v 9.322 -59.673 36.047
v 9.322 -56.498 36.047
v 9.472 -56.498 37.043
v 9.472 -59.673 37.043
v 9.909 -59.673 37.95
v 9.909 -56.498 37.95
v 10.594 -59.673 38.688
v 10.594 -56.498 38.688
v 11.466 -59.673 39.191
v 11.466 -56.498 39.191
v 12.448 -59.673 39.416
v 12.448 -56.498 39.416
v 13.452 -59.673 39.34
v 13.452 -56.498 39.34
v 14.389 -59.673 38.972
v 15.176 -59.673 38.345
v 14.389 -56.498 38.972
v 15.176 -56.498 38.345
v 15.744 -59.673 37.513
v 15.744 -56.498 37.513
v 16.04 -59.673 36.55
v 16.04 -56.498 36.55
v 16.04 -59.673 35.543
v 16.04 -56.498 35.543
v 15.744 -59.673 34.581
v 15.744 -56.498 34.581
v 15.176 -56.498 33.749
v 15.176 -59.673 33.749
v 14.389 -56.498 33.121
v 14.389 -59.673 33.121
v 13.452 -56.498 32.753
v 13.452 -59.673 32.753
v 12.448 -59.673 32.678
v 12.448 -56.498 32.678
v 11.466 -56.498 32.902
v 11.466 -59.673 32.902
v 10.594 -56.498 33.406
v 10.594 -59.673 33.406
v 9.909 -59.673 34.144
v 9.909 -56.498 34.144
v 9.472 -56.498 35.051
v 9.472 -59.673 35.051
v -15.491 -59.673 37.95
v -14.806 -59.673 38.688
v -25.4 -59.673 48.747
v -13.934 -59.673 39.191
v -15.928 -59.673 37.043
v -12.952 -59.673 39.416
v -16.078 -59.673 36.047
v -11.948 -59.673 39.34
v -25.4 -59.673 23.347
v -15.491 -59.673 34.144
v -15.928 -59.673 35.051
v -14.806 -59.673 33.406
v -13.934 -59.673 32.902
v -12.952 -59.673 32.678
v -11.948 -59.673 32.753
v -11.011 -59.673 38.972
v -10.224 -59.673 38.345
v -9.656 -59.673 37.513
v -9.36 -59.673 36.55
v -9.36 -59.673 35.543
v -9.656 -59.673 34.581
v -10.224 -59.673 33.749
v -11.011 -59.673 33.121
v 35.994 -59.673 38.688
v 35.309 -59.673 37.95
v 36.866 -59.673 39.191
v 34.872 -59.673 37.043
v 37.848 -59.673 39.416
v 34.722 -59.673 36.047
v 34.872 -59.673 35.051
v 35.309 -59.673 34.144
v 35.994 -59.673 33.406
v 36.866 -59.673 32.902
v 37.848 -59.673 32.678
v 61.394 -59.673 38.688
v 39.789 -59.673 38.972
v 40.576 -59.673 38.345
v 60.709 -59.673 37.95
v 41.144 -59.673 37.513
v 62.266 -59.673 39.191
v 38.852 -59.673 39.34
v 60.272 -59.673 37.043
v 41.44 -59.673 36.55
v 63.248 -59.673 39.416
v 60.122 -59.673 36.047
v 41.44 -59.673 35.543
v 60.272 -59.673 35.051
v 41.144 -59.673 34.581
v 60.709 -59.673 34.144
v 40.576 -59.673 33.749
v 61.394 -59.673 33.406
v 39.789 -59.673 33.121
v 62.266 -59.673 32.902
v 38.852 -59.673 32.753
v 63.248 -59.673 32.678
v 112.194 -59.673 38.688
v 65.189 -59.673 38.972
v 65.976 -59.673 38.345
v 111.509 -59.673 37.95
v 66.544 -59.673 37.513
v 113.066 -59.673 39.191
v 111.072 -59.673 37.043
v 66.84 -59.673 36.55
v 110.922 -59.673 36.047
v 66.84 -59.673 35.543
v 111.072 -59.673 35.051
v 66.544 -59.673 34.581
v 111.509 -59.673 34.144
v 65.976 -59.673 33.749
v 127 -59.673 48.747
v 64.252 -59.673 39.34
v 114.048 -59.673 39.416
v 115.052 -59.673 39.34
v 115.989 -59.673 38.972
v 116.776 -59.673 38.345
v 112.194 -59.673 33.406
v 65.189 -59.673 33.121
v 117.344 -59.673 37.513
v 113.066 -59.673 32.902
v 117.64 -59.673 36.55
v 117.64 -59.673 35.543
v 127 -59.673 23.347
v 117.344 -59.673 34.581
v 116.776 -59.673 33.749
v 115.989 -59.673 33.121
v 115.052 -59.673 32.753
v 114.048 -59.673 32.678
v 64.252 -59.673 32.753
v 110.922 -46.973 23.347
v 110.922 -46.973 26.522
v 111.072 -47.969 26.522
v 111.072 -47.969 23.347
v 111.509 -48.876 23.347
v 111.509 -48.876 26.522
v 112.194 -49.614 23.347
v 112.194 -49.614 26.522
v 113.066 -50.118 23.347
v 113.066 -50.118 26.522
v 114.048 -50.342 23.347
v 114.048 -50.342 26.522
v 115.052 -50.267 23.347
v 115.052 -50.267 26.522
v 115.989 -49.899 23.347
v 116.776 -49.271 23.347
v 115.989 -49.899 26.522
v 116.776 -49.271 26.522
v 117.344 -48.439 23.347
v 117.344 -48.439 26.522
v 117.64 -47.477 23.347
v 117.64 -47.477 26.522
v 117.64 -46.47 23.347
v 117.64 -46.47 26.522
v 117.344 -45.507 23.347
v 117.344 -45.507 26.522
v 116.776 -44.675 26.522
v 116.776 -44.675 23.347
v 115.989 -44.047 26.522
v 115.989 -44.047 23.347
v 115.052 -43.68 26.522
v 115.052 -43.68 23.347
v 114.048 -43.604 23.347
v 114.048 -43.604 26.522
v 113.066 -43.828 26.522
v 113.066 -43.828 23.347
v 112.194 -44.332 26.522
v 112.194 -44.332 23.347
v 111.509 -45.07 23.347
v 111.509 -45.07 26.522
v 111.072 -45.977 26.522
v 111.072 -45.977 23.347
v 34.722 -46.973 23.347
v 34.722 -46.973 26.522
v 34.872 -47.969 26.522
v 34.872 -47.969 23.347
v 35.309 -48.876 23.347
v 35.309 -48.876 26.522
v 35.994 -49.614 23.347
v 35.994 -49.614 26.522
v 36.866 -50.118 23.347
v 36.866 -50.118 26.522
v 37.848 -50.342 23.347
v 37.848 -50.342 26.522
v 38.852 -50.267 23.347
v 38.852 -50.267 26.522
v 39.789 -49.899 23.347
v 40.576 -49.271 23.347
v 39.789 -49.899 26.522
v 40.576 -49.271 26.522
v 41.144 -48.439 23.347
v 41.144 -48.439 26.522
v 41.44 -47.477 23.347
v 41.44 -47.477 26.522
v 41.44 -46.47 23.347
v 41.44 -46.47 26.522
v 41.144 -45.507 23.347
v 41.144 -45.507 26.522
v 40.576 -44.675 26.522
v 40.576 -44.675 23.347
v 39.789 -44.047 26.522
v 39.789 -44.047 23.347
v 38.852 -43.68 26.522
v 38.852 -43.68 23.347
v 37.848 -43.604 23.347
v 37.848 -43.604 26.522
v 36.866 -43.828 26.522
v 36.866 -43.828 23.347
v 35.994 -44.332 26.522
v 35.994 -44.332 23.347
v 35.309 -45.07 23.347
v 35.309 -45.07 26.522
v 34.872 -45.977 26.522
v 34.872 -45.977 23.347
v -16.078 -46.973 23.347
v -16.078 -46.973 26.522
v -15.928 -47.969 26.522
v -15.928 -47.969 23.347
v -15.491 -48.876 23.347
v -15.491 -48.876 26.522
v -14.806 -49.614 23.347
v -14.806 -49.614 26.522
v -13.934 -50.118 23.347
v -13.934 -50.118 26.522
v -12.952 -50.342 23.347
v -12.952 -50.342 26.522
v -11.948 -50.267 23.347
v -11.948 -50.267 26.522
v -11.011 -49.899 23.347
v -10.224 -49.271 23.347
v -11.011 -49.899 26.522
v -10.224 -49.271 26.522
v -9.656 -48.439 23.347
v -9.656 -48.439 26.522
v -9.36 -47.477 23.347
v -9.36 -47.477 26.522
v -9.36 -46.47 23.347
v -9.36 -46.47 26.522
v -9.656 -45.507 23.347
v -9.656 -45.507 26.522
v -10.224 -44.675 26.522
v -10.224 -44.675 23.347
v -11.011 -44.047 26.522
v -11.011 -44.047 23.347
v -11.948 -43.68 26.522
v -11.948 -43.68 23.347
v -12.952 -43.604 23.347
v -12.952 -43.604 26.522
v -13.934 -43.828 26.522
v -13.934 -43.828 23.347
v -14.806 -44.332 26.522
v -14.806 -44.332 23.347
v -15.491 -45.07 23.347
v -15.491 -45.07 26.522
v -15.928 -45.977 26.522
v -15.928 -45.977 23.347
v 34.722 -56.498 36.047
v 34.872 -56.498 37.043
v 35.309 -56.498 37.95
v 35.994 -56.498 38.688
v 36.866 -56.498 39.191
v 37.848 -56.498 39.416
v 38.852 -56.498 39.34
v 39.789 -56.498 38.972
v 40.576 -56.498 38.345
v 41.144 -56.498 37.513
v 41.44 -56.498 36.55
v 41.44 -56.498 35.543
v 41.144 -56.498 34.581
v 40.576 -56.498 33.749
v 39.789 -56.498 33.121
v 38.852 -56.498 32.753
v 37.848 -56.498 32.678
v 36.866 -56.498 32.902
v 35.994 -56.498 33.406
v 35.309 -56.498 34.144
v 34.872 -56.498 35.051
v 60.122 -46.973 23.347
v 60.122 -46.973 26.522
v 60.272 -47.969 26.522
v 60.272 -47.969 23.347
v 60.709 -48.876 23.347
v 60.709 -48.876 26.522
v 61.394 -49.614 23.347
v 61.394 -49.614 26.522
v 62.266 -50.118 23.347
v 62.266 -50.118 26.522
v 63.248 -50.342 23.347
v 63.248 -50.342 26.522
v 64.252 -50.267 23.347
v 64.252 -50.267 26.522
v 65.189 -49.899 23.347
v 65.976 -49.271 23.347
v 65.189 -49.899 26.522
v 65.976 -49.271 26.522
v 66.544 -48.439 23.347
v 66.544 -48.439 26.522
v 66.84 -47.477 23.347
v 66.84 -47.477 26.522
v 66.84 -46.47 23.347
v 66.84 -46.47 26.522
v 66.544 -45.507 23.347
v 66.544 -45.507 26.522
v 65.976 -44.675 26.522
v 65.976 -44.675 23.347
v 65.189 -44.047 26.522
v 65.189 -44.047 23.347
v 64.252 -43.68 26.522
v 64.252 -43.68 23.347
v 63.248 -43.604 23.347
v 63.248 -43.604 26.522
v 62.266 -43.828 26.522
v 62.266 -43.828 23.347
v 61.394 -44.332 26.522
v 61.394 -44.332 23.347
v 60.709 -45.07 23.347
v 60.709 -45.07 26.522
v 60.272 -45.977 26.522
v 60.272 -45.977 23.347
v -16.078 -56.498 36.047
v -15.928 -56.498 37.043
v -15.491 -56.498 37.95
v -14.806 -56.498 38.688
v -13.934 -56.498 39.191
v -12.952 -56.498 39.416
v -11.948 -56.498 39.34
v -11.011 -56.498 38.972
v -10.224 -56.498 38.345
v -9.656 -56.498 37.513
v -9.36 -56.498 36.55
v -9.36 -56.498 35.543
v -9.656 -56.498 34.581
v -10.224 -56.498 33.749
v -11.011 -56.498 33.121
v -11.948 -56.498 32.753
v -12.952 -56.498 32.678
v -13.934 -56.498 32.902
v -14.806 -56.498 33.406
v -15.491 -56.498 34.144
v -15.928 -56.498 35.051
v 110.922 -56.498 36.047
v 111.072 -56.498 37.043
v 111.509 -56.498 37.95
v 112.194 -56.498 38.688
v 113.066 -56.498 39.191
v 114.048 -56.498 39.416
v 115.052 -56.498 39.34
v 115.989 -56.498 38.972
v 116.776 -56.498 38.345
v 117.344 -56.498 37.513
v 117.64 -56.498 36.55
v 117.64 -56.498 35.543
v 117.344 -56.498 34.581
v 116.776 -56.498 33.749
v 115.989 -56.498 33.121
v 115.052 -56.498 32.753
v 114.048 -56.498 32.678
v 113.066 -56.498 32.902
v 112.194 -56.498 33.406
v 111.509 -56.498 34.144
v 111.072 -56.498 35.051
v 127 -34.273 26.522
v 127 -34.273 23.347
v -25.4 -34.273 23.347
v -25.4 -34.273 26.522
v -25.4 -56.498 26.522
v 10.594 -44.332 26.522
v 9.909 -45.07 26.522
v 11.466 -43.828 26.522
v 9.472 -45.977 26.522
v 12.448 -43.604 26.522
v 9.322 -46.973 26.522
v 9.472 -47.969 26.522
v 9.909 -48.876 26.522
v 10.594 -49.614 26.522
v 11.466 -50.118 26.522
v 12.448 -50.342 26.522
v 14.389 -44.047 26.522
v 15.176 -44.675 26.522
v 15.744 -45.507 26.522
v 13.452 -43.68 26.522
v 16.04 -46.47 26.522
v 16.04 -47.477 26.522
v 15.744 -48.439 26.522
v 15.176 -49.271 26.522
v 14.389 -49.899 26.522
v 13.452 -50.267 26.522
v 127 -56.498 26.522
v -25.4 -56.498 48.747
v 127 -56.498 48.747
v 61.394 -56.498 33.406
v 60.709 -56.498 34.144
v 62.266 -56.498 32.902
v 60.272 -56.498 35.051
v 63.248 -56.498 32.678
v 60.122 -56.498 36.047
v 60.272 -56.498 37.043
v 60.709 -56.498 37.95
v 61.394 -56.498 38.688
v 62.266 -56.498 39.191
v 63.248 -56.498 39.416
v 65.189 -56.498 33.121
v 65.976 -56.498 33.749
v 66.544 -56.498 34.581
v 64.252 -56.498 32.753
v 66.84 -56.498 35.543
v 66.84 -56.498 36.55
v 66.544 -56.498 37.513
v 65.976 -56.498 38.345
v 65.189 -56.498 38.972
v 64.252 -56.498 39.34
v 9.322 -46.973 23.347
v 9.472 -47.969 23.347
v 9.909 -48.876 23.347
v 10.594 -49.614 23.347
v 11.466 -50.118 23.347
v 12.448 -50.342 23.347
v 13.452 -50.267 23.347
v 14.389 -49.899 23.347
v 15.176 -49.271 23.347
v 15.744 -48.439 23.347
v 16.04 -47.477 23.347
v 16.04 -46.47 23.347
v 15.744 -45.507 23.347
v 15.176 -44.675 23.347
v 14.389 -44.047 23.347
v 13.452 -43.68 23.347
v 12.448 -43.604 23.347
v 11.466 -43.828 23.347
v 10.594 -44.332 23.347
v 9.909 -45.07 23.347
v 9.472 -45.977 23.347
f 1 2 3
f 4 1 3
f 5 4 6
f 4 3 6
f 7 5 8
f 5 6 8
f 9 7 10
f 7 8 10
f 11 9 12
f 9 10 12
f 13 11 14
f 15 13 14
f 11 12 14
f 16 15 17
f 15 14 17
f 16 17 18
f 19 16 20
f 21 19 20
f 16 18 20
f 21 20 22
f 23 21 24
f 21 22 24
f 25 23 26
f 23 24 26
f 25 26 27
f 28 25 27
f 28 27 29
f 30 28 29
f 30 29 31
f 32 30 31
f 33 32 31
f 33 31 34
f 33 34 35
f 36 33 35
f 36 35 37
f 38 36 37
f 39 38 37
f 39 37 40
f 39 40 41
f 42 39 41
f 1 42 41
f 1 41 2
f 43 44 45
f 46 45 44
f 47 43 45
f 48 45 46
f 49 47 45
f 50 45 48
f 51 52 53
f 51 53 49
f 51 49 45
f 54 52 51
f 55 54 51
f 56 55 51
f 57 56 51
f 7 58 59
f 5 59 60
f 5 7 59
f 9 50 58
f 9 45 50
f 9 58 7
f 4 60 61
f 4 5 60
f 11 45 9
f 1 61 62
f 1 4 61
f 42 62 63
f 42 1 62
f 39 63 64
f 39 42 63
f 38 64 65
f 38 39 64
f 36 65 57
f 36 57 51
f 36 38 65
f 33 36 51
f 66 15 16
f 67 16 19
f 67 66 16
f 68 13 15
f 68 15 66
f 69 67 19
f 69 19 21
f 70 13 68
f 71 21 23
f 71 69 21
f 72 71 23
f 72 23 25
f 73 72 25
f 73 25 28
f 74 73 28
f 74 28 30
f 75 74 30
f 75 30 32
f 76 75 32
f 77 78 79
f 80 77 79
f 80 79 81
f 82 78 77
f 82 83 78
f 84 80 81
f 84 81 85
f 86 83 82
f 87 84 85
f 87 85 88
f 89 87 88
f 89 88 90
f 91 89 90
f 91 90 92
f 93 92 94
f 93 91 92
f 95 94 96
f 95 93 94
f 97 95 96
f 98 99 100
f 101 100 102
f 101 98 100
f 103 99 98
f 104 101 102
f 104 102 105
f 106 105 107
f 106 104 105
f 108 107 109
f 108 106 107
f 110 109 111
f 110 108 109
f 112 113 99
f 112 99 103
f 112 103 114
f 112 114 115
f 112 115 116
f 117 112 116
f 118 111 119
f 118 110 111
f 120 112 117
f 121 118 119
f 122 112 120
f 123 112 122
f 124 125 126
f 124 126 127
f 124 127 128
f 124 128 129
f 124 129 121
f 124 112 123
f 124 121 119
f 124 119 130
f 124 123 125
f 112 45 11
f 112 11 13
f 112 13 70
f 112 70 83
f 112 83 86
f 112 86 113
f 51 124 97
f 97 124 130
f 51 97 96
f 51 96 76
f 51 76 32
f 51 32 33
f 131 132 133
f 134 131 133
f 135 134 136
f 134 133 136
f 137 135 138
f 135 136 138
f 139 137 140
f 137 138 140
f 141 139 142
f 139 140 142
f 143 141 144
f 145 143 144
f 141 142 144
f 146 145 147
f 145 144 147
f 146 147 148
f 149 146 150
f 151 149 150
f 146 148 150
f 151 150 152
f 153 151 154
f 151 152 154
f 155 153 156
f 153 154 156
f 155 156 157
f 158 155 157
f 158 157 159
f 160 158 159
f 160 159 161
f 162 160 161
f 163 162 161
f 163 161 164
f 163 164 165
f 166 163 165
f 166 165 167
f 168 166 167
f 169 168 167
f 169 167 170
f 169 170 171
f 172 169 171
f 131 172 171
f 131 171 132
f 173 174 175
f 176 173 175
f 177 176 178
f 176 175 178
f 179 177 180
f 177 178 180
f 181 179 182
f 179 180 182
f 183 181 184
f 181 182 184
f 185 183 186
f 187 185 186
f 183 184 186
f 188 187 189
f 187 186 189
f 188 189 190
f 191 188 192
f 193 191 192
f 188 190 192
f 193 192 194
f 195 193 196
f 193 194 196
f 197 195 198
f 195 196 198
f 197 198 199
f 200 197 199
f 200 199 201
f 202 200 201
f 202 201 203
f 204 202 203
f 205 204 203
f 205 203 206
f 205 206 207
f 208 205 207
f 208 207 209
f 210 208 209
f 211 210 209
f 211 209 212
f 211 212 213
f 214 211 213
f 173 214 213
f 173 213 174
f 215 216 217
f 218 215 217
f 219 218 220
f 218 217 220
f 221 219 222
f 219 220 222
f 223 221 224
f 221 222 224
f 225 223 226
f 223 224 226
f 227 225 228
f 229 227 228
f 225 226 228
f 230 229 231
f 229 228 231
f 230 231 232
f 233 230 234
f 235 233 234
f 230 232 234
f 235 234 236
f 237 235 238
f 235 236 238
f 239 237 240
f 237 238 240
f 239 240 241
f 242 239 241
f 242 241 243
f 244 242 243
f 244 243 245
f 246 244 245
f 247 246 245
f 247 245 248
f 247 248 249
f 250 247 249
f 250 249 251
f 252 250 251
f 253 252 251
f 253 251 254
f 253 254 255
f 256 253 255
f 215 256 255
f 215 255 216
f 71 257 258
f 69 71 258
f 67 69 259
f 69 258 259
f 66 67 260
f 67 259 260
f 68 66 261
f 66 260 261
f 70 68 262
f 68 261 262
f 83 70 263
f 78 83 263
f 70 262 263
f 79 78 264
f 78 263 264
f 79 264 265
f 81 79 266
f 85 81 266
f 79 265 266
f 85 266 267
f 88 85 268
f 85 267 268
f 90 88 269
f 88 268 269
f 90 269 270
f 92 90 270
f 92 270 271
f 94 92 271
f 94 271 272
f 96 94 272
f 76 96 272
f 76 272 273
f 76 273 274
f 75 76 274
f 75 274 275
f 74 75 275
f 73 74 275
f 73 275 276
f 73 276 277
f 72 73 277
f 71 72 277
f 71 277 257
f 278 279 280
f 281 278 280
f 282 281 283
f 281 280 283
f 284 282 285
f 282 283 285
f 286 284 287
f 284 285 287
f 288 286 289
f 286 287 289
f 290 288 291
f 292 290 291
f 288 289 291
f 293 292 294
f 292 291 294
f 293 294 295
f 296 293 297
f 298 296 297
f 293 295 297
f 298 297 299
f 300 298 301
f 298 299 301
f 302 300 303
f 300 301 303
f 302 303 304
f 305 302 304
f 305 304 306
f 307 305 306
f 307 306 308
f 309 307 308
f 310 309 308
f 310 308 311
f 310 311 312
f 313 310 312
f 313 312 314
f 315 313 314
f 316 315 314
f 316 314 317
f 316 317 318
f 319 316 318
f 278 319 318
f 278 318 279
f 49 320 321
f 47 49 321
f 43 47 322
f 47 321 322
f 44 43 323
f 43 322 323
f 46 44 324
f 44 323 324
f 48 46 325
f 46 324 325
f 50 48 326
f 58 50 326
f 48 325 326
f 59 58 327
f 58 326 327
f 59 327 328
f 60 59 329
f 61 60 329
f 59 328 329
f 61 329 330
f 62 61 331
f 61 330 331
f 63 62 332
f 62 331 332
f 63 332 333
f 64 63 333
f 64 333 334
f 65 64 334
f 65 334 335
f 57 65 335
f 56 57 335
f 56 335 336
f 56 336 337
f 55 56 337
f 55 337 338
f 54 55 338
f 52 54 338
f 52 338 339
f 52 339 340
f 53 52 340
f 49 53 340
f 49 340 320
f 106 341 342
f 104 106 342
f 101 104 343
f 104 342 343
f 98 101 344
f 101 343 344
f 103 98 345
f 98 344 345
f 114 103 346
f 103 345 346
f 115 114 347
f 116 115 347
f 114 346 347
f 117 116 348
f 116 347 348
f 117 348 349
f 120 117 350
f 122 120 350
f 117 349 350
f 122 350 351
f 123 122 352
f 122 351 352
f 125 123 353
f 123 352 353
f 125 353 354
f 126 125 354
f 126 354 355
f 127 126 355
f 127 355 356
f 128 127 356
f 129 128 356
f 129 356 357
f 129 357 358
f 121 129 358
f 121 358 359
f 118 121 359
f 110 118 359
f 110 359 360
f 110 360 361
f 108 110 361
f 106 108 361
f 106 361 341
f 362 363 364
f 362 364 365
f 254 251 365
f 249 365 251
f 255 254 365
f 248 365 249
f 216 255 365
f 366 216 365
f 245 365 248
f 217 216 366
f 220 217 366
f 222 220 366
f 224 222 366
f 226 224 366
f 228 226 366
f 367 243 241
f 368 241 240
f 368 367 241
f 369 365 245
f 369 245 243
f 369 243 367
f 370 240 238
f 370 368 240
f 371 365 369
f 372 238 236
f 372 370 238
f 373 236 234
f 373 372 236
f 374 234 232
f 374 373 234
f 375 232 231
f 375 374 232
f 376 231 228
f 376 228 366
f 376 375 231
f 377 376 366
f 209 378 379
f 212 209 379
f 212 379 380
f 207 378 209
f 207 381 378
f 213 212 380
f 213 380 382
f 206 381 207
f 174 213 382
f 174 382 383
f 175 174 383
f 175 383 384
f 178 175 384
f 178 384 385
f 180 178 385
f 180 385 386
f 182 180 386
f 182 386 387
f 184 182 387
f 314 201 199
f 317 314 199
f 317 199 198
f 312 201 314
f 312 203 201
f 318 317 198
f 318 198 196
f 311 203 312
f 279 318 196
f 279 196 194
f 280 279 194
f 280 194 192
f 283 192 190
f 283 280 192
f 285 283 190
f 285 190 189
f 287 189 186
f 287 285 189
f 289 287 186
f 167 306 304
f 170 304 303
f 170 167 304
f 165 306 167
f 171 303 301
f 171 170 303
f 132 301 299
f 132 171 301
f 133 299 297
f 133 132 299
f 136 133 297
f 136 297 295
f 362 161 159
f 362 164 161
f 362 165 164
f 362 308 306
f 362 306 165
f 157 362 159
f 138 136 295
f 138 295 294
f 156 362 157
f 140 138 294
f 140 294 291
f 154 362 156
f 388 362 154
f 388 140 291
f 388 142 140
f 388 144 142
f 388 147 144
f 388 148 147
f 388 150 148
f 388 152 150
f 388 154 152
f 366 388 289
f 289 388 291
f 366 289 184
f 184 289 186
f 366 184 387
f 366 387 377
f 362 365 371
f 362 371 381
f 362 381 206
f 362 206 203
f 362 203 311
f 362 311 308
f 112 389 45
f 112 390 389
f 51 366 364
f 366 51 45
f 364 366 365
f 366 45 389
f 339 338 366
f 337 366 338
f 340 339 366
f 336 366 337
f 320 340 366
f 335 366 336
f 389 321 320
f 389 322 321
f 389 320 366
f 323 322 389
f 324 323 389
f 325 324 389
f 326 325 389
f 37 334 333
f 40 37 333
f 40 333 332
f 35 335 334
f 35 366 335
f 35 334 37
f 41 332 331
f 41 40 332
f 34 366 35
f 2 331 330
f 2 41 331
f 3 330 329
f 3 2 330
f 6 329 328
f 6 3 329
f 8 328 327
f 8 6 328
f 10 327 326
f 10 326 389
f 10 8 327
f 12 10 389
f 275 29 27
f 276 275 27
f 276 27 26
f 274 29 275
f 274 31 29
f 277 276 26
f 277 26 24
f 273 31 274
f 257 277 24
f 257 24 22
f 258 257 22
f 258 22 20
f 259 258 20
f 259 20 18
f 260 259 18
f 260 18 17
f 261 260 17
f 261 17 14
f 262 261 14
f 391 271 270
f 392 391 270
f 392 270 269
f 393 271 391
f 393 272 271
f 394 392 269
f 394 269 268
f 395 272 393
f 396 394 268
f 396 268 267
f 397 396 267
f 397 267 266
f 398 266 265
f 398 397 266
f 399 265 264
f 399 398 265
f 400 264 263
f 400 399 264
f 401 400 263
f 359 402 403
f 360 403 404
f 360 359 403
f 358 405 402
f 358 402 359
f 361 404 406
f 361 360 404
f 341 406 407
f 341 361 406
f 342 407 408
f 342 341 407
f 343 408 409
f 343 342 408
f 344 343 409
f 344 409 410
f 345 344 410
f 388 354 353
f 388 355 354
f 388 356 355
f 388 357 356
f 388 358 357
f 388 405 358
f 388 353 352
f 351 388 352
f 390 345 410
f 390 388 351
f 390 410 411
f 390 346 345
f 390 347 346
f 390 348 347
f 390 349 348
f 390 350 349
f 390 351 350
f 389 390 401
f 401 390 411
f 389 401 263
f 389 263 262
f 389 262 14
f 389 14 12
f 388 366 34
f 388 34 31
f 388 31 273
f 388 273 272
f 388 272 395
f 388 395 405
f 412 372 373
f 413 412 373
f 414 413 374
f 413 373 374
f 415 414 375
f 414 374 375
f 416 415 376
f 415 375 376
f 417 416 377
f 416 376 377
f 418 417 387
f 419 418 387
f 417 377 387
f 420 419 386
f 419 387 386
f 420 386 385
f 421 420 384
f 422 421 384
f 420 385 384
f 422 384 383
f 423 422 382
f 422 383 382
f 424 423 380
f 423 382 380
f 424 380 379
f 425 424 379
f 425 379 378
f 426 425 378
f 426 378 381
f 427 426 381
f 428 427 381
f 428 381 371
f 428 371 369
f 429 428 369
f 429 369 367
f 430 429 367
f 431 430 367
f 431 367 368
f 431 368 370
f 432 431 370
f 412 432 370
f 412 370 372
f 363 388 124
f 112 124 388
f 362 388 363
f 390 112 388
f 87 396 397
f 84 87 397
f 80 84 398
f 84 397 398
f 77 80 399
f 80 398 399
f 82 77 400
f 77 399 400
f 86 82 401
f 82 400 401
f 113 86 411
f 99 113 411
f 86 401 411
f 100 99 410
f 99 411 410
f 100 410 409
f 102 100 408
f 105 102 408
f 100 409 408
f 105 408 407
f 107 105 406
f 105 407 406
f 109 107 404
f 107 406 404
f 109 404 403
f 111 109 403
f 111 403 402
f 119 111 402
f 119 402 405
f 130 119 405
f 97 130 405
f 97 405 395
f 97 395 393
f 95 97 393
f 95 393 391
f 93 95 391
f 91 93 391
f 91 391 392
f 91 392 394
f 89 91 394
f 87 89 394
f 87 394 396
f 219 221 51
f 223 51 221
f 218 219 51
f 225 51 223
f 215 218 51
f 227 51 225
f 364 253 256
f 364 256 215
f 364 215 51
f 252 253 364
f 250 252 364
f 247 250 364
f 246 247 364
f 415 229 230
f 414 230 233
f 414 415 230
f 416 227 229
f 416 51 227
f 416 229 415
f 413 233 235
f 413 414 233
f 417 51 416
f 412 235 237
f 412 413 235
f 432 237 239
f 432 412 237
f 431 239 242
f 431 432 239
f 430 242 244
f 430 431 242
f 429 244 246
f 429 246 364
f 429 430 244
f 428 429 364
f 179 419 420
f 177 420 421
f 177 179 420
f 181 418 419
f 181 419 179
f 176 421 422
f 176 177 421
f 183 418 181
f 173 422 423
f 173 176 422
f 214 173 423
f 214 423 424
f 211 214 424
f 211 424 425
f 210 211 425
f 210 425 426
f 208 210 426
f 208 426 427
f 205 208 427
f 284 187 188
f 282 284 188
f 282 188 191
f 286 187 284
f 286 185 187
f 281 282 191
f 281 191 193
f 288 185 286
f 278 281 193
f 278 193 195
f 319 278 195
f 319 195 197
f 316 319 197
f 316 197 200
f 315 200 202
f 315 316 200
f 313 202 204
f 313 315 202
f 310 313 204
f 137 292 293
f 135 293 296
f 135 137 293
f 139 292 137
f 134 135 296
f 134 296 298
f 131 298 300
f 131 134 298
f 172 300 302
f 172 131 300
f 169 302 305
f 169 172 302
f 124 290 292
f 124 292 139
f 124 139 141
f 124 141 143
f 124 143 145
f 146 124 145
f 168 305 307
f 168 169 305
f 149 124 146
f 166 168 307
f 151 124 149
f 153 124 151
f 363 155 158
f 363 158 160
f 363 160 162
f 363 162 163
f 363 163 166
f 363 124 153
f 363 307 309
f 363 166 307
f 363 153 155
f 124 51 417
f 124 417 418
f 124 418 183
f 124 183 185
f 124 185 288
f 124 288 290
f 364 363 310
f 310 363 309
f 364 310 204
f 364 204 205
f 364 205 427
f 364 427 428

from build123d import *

# Parameters (mm, degrees)
F1_DEPTH       = 127
F2_DEPTH       = 25.4
F5_D           = 6.7564
F5_DEPTH       = 76.2
F5_TIP         = 2.0298273432
F5_ON_F3_D     = 6.7564
F5_ON_F3_DEPTH = 76.2
F5_ON_F3_TIP   = 2.0298273432


with BuildPart() as f1:
    # F0 (on Right) → F1 (new body)
    with BuildSketch(Plane.YZ):
        Polygon((-56.4980393835, 48.746819774), (-59.6730393835, 48.746819774), (-59.6730393835, 23.346819774), (-34.2730393835, 23.346819774), (-34.2730393835, 26.521819774), (-56.4980393835, 26.521819774), align=None)
    extrude(amount=F1_DEPTH)

    # F2 (add): a face of the model
    f2_faces = [f1.faces().sort_by_distance(p)[0] for p in [
        (0, -58.0855393835, 48.3876095291),
    ]]
    extrude(f2_faces, amount=F2_DEPTH)

    # F5
    with Locations(Plane(origin=(0, 0, 23.346819774), x_dir=(1, 0, 0), z_dir=(0, 0, -1))):
        with Locations((114.3, 46.9730393835), (63.5, 46.9730393835), (38.1, 46.9730393835), (12.7, 46.9730393835), (-12.7, 46.9730393835)):
            Hole(F5_D / 2, depth=F5_DEPTH)
            with Locations((0, 0, -(F5_DEPTH + F5_TIP / 2))):  # 118° drill point
                Cone(0, F5_D / 2, F5_TIP, mode=Mode.SUBTRACT)

    # F5 on F3
    with Locations(Plane.XZ.offset(59.6730393835)):
        with Locations((114.3, 36.046819774), (63.5, 36.046819774), (38.1, 36.046819774), (12.7, 36.046819774), (-12.7, 36.046819774)):
            Hole(F5_ON_F3_D / 2, depth=F5_ON_F3_DEPTH)
            with Locations((0, 0, -(F5_ON_F3_DEPTH + F5_ON_F3_TIP / 2))):  # 118° drill point
                Cone(0, F5_ON_F3_D / 2, F5_ON_F3_TIP, mode=Mode.SUBTRACT)


solid = f1.part
